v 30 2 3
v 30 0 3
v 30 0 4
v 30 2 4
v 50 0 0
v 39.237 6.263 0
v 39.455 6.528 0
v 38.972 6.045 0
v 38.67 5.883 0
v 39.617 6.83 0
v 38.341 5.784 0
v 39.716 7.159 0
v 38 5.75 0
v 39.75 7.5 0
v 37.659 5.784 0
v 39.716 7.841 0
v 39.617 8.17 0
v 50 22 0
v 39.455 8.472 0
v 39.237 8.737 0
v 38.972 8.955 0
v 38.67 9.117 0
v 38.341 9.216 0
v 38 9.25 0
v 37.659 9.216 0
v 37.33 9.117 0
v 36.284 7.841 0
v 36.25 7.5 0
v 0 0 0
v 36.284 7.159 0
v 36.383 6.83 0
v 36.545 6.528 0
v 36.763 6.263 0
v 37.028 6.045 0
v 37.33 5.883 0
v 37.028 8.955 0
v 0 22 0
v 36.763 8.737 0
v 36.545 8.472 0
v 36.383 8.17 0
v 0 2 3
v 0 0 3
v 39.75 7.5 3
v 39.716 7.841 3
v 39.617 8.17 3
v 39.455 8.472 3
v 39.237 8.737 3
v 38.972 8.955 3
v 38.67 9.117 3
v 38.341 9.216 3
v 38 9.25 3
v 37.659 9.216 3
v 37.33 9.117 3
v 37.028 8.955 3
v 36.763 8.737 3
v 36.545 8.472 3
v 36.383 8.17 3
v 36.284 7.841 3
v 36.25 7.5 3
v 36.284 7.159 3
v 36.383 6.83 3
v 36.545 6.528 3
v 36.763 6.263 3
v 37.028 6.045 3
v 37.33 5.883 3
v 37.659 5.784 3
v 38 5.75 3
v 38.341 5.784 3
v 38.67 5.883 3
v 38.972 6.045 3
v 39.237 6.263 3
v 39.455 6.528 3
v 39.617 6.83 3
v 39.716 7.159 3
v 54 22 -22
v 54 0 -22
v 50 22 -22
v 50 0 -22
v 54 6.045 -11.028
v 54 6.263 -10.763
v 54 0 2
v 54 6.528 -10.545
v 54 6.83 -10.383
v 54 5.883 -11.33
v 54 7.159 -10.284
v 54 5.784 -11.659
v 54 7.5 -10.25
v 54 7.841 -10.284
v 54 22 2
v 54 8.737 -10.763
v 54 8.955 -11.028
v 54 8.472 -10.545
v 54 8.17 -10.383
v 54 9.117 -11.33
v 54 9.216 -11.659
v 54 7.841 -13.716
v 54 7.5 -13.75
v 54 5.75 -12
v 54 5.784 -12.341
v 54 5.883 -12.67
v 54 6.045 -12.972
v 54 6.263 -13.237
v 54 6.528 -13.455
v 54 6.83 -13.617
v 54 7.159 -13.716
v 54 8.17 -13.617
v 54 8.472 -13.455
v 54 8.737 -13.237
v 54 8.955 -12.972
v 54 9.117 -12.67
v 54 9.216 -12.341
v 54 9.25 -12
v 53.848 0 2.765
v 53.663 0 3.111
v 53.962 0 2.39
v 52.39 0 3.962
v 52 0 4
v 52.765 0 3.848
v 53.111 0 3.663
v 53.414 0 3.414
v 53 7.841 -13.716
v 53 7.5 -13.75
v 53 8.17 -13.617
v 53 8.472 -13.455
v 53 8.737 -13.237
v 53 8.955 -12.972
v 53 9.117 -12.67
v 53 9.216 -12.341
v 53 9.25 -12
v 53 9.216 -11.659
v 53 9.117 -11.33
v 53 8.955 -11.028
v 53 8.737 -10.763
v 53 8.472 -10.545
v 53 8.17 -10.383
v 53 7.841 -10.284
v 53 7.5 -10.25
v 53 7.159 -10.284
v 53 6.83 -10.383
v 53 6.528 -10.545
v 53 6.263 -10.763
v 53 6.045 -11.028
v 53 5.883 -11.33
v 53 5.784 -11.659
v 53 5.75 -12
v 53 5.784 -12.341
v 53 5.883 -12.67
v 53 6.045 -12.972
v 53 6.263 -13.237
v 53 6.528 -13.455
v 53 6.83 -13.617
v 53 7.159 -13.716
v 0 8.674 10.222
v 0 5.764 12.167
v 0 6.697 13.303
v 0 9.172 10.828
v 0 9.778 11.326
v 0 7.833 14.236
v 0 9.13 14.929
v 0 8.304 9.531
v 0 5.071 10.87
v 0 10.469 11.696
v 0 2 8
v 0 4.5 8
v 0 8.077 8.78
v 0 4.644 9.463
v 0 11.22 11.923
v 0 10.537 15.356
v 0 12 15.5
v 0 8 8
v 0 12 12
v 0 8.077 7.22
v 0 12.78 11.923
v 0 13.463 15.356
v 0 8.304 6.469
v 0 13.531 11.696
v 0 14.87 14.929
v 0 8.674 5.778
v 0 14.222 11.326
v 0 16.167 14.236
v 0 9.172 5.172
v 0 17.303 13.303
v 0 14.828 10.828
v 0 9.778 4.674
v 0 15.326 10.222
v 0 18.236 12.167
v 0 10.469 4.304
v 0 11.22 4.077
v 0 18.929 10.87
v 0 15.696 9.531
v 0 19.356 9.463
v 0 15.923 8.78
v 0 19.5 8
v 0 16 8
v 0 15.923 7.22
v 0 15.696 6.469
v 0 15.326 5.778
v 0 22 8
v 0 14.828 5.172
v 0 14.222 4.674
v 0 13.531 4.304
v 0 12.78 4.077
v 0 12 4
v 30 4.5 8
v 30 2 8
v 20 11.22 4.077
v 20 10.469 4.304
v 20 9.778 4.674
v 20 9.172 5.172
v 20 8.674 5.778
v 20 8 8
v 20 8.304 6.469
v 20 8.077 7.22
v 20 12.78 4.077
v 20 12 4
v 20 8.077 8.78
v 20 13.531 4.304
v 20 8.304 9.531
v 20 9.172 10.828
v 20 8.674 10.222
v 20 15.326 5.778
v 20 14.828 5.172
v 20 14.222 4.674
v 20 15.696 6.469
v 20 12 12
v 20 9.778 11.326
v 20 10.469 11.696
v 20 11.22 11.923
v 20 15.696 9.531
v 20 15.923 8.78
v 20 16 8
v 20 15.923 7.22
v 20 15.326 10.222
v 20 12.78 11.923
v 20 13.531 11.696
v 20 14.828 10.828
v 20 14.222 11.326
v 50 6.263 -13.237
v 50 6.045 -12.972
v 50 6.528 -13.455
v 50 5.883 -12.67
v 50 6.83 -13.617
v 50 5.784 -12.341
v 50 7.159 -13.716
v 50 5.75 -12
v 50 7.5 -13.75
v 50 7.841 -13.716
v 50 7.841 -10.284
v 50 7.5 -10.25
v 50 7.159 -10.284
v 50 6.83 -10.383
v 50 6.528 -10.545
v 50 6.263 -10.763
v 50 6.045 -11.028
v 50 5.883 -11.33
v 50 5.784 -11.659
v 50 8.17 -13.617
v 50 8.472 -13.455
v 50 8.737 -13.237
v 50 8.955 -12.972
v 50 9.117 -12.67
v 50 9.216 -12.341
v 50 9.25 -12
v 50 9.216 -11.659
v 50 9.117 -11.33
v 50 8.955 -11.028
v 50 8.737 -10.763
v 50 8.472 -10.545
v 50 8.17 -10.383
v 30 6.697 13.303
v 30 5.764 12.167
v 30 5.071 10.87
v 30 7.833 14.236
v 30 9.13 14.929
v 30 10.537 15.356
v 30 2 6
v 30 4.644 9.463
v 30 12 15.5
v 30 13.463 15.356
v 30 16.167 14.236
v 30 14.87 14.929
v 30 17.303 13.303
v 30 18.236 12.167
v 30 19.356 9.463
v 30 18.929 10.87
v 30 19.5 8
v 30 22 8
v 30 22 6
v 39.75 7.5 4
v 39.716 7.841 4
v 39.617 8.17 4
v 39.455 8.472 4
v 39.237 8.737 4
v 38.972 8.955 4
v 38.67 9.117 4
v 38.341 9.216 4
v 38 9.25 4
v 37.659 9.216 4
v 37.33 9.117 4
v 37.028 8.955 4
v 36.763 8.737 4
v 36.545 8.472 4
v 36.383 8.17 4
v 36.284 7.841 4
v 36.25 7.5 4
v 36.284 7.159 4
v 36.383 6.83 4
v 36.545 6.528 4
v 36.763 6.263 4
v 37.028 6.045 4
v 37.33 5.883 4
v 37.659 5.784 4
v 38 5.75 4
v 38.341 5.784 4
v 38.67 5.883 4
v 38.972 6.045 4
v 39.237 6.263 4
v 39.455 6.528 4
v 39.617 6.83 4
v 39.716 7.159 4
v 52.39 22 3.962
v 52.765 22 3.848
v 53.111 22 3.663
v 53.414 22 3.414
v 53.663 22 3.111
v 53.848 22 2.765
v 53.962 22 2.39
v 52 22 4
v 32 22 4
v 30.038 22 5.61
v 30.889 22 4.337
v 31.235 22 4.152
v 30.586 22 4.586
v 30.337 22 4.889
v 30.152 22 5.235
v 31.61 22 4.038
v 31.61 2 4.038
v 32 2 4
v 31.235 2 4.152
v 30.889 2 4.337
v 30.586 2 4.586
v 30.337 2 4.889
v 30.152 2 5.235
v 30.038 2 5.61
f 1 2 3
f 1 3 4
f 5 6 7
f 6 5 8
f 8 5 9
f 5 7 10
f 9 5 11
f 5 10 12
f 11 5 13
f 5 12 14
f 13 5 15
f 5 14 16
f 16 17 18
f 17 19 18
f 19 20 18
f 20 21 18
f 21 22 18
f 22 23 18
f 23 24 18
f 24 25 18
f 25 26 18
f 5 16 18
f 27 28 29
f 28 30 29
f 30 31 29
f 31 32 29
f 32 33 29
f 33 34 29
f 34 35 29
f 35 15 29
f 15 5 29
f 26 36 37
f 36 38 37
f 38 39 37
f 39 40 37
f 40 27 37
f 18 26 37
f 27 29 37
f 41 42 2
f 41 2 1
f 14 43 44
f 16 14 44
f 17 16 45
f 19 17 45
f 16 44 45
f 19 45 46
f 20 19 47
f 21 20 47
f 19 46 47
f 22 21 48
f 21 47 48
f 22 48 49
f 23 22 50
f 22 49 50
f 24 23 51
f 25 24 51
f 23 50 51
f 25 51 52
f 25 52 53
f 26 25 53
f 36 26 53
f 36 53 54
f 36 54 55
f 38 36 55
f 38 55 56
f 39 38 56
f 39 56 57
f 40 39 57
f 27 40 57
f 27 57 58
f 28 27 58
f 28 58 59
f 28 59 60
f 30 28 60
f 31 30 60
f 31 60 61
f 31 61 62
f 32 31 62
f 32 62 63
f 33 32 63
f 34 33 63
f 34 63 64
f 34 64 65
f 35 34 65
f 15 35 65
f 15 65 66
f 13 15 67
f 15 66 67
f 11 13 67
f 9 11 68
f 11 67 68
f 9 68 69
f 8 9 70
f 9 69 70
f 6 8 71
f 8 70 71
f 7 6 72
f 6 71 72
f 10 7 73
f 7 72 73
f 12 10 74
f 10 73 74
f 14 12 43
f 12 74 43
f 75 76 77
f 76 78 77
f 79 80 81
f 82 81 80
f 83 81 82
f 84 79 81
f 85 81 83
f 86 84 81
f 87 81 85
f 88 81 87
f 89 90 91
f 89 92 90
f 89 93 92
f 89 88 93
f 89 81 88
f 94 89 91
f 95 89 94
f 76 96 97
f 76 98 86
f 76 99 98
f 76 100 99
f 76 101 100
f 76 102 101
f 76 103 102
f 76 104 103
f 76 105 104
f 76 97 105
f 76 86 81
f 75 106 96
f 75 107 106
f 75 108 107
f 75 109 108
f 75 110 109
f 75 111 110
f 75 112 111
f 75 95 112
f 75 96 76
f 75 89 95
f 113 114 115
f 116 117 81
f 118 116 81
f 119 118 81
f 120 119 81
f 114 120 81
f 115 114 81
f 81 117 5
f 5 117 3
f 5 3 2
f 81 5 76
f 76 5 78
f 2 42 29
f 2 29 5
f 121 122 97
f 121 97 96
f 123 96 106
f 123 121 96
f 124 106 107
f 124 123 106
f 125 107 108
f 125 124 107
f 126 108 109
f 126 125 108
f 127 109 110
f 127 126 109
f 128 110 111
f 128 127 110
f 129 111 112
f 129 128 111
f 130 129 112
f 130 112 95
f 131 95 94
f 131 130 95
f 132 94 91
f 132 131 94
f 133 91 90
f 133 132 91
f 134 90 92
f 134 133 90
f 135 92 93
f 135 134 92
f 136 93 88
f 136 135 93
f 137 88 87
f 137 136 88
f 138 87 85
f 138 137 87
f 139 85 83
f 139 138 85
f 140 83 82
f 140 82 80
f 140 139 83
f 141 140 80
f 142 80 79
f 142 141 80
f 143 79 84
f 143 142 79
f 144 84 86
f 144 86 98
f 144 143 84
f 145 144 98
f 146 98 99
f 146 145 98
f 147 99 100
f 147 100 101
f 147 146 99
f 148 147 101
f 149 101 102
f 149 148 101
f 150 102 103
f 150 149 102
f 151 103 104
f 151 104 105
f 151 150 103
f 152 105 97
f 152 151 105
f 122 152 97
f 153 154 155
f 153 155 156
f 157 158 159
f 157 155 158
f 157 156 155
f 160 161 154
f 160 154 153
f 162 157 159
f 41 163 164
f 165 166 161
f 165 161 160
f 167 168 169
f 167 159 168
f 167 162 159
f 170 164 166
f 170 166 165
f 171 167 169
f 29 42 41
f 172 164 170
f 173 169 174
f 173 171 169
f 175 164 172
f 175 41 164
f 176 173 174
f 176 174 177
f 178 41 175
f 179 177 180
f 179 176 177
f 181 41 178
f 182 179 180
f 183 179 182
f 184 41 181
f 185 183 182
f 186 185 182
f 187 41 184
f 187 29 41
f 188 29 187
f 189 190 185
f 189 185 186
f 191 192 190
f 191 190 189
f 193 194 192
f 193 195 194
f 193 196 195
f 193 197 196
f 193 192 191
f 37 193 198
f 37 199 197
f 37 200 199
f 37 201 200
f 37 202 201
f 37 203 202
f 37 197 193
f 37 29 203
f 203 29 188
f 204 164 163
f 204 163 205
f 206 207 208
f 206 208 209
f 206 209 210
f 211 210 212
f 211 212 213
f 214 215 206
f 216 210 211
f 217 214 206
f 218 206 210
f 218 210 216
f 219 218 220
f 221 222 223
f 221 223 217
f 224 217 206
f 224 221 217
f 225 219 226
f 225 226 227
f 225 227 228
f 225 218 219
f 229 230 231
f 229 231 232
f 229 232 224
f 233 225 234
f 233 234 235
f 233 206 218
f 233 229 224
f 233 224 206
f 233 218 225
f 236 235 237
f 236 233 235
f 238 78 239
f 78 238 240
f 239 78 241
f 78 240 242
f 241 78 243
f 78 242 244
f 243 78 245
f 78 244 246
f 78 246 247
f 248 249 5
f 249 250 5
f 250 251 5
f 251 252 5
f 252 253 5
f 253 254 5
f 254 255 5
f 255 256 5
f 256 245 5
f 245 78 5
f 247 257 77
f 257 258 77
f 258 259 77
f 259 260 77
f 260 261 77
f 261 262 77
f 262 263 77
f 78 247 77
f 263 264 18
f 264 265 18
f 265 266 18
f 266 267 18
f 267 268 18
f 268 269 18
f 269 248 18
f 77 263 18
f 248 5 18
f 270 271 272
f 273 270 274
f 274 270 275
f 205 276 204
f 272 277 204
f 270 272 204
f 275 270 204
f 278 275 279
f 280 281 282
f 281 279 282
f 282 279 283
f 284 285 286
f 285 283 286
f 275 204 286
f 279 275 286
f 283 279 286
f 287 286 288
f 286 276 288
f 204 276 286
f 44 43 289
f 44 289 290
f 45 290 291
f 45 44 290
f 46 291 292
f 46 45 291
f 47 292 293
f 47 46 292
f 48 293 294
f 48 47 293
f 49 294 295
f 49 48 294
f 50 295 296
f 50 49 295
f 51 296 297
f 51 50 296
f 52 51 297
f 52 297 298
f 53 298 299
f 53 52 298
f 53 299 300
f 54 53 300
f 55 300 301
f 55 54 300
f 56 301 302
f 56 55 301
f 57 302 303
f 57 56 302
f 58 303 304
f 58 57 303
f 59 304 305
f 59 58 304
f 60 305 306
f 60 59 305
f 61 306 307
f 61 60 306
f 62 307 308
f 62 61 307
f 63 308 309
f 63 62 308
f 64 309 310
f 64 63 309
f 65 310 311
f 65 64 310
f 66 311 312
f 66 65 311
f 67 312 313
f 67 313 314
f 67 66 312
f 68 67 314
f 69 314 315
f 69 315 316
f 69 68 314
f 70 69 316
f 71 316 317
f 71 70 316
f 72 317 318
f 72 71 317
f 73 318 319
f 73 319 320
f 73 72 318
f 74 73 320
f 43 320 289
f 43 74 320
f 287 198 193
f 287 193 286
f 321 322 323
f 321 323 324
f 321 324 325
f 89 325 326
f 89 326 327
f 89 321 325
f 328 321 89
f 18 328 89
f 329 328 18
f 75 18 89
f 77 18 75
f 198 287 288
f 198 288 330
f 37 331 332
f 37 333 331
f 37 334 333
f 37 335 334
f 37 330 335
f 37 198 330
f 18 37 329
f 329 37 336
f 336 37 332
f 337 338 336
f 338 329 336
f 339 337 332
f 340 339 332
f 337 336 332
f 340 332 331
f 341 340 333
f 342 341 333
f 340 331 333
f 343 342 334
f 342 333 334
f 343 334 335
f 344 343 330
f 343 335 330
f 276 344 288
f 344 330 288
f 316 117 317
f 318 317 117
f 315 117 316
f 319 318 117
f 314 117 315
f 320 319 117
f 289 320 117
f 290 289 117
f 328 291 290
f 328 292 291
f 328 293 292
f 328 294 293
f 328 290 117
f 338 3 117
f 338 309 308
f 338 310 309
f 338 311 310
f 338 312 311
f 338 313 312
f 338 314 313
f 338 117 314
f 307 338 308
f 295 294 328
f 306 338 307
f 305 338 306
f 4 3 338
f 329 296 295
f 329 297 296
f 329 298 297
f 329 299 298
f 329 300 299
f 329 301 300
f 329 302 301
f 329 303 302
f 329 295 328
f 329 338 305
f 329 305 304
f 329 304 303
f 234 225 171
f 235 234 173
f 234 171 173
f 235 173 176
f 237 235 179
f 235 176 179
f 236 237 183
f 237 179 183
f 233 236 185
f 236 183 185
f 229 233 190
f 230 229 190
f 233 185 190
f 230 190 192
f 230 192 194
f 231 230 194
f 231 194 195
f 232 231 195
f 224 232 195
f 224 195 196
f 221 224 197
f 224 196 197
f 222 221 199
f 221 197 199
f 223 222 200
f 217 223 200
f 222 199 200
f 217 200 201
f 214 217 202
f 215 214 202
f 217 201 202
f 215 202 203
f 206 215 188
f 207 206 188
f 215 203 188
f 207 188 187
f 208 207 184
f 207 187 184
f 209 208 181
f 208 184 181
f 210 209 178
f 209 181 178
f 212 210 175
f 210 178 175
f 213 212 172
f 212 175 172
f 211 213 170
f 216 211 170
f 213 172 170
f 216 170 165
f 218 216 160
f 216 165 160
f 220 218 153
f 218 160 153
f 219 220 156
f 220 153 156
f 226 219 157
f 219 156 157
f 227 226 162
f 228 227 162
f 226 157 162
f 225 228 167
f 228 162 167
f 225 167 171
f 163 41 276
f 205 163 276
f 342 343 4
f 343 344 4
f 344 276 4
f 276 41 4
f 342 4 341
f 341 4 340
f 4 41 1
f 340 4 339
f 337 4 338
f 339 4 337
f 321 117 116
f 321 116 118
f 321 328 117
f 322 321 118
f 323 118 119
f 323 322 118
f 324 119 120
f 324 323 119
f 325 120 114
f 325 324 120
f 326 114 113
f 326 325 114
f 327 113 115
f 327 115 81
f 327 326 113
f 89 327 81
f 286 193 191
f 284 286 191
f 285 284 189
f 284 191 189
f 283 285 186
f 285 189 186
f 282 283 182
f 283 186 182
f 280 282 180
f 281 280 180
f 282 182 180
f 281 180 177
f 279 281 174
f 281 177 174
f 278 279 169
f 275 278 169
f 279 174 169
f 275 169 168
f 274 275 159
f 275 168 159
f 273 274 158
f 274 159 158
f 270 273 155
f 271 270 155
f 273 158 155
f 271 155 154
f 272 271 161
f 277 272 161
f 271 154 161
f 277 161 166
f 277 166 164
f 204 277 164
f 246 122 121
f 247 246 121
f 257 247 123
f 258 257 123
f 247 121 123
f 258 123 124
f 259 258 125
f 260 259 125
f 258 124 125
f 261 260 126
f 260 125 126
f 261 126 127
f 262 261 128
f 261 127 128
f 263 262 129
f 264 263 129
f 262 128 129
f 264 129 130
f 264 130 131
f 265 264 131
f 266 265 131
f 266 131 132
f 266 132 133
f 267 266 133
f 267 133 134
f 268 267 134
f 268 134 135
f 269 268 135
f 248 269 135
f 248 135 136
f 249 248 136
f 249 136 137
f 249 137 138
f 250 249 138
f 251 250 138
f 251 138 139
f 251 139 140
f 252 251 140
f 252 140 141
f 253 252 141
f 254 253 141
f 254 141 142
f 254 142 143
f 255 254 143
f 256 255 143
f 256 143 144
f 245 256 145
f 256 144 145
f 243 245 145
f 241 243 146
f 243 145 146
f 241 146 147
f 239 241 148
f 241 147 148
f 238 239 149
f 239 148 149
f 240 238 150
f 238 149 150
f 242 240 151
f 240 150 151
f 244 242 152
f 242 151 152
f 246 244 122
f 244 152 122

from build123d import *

# Parameters (mm, degrees)
SKETCH1_W           = 50
SKETCH1_H           = 30
BOSS_EXTRUDE1_DEPTH = 3
SKETCH2_R           = 1.75
CUT_EXTRUDE1_DEPTH  = 4
SKETCH3_W           = 30
SKETCH3_H           = 20
BOSS_EXTRUDE2_DEPTH = 5
BOSS_EXTRUDE3_DEPTH = 30
SKETCH5_R           = 4
CUT_EXTRUDE2_DEPTH  = 20
SKETCH6_W           = 50
SKETCH6_H           = 8
CUT_EXTRUDE3_DEPTH  = 20
SKETCH7_W           = 3
SKETCH7_H           = 22
BOSS_EXTRUDE4_DEPTH = 3
SKETCH8_W           = 3
SKETCH8_H           = 22
BOSS_EXTRUDE5_DEPTH = 22
SKETCH9_R           = 1.75
CUT_EXTRUDE4_DEPTH  = 54
SKETCH10_W          = 23
SKETCH10_H          = 22
SKETCH10_R          = 1.75
BOSS_EXTRUDE6_DEPTH = 1
SKETCH11_W          = 26
SKETCH11_H          = 22
SKETCH11_R          = 1.75
BOSS_EXTRUDE7_DEPTH = 1
FILLET1_R           = 2


with BuildPart() as part:
    # Sketch1 → Boss-Extrude1 (new body)
    with BuildSketch(Plane.XY):
        with Locations((25, 15)):
            Rectangle(SKETCH1_W, SKETCH1_H)
    extrude(amount=BOSS_EXTRUDE1_DEPTH)

    # Sketch2 → Cut-Extrude1 (cut, through all)
    with BuildSketch(Plane.XY.offset(3)):
        with Locations((38, 7.5)):
            Circle(SKETCH2_R)
    extrude(amount=-CUT_EXTRUDE1_DEPTH, mode=Mode.SUBTRACT)

    # Sketch3 → Boss-Extrude2 (add)
    with BuildSketch(Plane.XY.offset(3)):
        with Locations((15, 12)):
            Rectangle(SKETCH3_W, SKETCH3_H)
    extrude(amount=BOSS_EXTRUDE2_DEPTH)

    # Sketch4 → Boss-Extrude3 (add)
    with BuildSketch(Plane.ZY):
        with BuildLine():
            Line((8, 4.5), (8, 19.5))
            ThreePointArc((8, 19.5), (15.5, 12), (8, 4.5))
        make_face()
    extrude(amount=-BOSS_EXTRUDE3_DEPTH)

    # Sketch5 → Cut-Extrude2 (cut)
    with BuildSketch(Plane.ZY):
        with Locations((8, 12)):
            Circle(SKETCH5_R)
    extrude(amount=-CUT_EXTRUDE2_DEPTH, mode=Mode.SUBTRACT)

    # Sketch6 → Cut-Extrude3 (cut)
    with BuildSketch(Plane.XY.offset(3)):
        with Locations((25, 26)):
            Rectangle(SKETCH6_W, SKETCH6_H)
    extrude(amount=-CUT_EXTRUDE3_DEPTH, mode=Mode.SUBTRACT)

    # Sketch7 → Boss-Extrude4 (add)
    with BuildSketch(Plane(origin=(50, 0, 0), x_dir=(0, 0, -1), z_dir=(1, 0, 0))):
        with Locations((-1.5, 11)):
            Rectangle(SKETCH7_W, SKETCH7_H)
    extrude(amount=BOSS_EXTRUDE4_DEPTH)

    # Sketch8 → Boss-Extrude5 (add)
    with BuildSketch(Plane(origin=(0, 0, 0), x_dir=(-1, 0, 0), z_dir=(0, 0, -1))):
        with Locations((-51.5, 11)):
            Rectangle(SKETCH8_W, SKETCH8_H)
    extrude(amount=BOSS_EXTRUDE5_DEPTH)

    # Sketch9 → Cut-Extrude4 (cut, through all)
    with BuildSketch(Plane(origin=(53, 0, 0), x_dir=(0, 0, -1), z_dir=(1, 0, 0))):
        with Locations((12, 7.5)):
            Circle(SKETCH9_R)
    extrude(amount=-CUT_EXTRUDE4_DEPTH, mode=Mode.SUBTRACT)

    # Sketch10 → Boss-Extrude6 (add)
    with BuildSketch(Plane.XY.offset(3)):
        with Locations((41.5, 11)):
            Rectangle(SKETCH10_W, SKETCH10_H)
        with Locations((38, 7.5)):
            Circle(SKETCH10_R, mode=Mode.SUBTRACT)
    extrude(amount=BOSS_EXTRUDE6_DEPTH)

    # Sketch11 → Boss-Extrude7 (add)
    with BuildSketch(Plane(origin=(53, 0, 0), x_dir=(0, 0, -1), z_dir=(1, 0, 0))):
        with Locations((9, 11)):
            Rectangle(SKETCH11_W, SKETCH11_H)
        with Locations((12, 7.5)):
            Circle(SKETCH11_R, mode=Mode.SUBTRACT)
    extrude(amount=BOSS_EXTRUDE7_DEPTH)

    # Fillet1
    fillet1_edges = [part.edges().sort_by_distance(p)[0] for p in [
        (30, 12, 4),
        (54, 11, 4),
    ]]
    fillet(fillet1_edges, radius=FILLET1_R)


solid = part.part
